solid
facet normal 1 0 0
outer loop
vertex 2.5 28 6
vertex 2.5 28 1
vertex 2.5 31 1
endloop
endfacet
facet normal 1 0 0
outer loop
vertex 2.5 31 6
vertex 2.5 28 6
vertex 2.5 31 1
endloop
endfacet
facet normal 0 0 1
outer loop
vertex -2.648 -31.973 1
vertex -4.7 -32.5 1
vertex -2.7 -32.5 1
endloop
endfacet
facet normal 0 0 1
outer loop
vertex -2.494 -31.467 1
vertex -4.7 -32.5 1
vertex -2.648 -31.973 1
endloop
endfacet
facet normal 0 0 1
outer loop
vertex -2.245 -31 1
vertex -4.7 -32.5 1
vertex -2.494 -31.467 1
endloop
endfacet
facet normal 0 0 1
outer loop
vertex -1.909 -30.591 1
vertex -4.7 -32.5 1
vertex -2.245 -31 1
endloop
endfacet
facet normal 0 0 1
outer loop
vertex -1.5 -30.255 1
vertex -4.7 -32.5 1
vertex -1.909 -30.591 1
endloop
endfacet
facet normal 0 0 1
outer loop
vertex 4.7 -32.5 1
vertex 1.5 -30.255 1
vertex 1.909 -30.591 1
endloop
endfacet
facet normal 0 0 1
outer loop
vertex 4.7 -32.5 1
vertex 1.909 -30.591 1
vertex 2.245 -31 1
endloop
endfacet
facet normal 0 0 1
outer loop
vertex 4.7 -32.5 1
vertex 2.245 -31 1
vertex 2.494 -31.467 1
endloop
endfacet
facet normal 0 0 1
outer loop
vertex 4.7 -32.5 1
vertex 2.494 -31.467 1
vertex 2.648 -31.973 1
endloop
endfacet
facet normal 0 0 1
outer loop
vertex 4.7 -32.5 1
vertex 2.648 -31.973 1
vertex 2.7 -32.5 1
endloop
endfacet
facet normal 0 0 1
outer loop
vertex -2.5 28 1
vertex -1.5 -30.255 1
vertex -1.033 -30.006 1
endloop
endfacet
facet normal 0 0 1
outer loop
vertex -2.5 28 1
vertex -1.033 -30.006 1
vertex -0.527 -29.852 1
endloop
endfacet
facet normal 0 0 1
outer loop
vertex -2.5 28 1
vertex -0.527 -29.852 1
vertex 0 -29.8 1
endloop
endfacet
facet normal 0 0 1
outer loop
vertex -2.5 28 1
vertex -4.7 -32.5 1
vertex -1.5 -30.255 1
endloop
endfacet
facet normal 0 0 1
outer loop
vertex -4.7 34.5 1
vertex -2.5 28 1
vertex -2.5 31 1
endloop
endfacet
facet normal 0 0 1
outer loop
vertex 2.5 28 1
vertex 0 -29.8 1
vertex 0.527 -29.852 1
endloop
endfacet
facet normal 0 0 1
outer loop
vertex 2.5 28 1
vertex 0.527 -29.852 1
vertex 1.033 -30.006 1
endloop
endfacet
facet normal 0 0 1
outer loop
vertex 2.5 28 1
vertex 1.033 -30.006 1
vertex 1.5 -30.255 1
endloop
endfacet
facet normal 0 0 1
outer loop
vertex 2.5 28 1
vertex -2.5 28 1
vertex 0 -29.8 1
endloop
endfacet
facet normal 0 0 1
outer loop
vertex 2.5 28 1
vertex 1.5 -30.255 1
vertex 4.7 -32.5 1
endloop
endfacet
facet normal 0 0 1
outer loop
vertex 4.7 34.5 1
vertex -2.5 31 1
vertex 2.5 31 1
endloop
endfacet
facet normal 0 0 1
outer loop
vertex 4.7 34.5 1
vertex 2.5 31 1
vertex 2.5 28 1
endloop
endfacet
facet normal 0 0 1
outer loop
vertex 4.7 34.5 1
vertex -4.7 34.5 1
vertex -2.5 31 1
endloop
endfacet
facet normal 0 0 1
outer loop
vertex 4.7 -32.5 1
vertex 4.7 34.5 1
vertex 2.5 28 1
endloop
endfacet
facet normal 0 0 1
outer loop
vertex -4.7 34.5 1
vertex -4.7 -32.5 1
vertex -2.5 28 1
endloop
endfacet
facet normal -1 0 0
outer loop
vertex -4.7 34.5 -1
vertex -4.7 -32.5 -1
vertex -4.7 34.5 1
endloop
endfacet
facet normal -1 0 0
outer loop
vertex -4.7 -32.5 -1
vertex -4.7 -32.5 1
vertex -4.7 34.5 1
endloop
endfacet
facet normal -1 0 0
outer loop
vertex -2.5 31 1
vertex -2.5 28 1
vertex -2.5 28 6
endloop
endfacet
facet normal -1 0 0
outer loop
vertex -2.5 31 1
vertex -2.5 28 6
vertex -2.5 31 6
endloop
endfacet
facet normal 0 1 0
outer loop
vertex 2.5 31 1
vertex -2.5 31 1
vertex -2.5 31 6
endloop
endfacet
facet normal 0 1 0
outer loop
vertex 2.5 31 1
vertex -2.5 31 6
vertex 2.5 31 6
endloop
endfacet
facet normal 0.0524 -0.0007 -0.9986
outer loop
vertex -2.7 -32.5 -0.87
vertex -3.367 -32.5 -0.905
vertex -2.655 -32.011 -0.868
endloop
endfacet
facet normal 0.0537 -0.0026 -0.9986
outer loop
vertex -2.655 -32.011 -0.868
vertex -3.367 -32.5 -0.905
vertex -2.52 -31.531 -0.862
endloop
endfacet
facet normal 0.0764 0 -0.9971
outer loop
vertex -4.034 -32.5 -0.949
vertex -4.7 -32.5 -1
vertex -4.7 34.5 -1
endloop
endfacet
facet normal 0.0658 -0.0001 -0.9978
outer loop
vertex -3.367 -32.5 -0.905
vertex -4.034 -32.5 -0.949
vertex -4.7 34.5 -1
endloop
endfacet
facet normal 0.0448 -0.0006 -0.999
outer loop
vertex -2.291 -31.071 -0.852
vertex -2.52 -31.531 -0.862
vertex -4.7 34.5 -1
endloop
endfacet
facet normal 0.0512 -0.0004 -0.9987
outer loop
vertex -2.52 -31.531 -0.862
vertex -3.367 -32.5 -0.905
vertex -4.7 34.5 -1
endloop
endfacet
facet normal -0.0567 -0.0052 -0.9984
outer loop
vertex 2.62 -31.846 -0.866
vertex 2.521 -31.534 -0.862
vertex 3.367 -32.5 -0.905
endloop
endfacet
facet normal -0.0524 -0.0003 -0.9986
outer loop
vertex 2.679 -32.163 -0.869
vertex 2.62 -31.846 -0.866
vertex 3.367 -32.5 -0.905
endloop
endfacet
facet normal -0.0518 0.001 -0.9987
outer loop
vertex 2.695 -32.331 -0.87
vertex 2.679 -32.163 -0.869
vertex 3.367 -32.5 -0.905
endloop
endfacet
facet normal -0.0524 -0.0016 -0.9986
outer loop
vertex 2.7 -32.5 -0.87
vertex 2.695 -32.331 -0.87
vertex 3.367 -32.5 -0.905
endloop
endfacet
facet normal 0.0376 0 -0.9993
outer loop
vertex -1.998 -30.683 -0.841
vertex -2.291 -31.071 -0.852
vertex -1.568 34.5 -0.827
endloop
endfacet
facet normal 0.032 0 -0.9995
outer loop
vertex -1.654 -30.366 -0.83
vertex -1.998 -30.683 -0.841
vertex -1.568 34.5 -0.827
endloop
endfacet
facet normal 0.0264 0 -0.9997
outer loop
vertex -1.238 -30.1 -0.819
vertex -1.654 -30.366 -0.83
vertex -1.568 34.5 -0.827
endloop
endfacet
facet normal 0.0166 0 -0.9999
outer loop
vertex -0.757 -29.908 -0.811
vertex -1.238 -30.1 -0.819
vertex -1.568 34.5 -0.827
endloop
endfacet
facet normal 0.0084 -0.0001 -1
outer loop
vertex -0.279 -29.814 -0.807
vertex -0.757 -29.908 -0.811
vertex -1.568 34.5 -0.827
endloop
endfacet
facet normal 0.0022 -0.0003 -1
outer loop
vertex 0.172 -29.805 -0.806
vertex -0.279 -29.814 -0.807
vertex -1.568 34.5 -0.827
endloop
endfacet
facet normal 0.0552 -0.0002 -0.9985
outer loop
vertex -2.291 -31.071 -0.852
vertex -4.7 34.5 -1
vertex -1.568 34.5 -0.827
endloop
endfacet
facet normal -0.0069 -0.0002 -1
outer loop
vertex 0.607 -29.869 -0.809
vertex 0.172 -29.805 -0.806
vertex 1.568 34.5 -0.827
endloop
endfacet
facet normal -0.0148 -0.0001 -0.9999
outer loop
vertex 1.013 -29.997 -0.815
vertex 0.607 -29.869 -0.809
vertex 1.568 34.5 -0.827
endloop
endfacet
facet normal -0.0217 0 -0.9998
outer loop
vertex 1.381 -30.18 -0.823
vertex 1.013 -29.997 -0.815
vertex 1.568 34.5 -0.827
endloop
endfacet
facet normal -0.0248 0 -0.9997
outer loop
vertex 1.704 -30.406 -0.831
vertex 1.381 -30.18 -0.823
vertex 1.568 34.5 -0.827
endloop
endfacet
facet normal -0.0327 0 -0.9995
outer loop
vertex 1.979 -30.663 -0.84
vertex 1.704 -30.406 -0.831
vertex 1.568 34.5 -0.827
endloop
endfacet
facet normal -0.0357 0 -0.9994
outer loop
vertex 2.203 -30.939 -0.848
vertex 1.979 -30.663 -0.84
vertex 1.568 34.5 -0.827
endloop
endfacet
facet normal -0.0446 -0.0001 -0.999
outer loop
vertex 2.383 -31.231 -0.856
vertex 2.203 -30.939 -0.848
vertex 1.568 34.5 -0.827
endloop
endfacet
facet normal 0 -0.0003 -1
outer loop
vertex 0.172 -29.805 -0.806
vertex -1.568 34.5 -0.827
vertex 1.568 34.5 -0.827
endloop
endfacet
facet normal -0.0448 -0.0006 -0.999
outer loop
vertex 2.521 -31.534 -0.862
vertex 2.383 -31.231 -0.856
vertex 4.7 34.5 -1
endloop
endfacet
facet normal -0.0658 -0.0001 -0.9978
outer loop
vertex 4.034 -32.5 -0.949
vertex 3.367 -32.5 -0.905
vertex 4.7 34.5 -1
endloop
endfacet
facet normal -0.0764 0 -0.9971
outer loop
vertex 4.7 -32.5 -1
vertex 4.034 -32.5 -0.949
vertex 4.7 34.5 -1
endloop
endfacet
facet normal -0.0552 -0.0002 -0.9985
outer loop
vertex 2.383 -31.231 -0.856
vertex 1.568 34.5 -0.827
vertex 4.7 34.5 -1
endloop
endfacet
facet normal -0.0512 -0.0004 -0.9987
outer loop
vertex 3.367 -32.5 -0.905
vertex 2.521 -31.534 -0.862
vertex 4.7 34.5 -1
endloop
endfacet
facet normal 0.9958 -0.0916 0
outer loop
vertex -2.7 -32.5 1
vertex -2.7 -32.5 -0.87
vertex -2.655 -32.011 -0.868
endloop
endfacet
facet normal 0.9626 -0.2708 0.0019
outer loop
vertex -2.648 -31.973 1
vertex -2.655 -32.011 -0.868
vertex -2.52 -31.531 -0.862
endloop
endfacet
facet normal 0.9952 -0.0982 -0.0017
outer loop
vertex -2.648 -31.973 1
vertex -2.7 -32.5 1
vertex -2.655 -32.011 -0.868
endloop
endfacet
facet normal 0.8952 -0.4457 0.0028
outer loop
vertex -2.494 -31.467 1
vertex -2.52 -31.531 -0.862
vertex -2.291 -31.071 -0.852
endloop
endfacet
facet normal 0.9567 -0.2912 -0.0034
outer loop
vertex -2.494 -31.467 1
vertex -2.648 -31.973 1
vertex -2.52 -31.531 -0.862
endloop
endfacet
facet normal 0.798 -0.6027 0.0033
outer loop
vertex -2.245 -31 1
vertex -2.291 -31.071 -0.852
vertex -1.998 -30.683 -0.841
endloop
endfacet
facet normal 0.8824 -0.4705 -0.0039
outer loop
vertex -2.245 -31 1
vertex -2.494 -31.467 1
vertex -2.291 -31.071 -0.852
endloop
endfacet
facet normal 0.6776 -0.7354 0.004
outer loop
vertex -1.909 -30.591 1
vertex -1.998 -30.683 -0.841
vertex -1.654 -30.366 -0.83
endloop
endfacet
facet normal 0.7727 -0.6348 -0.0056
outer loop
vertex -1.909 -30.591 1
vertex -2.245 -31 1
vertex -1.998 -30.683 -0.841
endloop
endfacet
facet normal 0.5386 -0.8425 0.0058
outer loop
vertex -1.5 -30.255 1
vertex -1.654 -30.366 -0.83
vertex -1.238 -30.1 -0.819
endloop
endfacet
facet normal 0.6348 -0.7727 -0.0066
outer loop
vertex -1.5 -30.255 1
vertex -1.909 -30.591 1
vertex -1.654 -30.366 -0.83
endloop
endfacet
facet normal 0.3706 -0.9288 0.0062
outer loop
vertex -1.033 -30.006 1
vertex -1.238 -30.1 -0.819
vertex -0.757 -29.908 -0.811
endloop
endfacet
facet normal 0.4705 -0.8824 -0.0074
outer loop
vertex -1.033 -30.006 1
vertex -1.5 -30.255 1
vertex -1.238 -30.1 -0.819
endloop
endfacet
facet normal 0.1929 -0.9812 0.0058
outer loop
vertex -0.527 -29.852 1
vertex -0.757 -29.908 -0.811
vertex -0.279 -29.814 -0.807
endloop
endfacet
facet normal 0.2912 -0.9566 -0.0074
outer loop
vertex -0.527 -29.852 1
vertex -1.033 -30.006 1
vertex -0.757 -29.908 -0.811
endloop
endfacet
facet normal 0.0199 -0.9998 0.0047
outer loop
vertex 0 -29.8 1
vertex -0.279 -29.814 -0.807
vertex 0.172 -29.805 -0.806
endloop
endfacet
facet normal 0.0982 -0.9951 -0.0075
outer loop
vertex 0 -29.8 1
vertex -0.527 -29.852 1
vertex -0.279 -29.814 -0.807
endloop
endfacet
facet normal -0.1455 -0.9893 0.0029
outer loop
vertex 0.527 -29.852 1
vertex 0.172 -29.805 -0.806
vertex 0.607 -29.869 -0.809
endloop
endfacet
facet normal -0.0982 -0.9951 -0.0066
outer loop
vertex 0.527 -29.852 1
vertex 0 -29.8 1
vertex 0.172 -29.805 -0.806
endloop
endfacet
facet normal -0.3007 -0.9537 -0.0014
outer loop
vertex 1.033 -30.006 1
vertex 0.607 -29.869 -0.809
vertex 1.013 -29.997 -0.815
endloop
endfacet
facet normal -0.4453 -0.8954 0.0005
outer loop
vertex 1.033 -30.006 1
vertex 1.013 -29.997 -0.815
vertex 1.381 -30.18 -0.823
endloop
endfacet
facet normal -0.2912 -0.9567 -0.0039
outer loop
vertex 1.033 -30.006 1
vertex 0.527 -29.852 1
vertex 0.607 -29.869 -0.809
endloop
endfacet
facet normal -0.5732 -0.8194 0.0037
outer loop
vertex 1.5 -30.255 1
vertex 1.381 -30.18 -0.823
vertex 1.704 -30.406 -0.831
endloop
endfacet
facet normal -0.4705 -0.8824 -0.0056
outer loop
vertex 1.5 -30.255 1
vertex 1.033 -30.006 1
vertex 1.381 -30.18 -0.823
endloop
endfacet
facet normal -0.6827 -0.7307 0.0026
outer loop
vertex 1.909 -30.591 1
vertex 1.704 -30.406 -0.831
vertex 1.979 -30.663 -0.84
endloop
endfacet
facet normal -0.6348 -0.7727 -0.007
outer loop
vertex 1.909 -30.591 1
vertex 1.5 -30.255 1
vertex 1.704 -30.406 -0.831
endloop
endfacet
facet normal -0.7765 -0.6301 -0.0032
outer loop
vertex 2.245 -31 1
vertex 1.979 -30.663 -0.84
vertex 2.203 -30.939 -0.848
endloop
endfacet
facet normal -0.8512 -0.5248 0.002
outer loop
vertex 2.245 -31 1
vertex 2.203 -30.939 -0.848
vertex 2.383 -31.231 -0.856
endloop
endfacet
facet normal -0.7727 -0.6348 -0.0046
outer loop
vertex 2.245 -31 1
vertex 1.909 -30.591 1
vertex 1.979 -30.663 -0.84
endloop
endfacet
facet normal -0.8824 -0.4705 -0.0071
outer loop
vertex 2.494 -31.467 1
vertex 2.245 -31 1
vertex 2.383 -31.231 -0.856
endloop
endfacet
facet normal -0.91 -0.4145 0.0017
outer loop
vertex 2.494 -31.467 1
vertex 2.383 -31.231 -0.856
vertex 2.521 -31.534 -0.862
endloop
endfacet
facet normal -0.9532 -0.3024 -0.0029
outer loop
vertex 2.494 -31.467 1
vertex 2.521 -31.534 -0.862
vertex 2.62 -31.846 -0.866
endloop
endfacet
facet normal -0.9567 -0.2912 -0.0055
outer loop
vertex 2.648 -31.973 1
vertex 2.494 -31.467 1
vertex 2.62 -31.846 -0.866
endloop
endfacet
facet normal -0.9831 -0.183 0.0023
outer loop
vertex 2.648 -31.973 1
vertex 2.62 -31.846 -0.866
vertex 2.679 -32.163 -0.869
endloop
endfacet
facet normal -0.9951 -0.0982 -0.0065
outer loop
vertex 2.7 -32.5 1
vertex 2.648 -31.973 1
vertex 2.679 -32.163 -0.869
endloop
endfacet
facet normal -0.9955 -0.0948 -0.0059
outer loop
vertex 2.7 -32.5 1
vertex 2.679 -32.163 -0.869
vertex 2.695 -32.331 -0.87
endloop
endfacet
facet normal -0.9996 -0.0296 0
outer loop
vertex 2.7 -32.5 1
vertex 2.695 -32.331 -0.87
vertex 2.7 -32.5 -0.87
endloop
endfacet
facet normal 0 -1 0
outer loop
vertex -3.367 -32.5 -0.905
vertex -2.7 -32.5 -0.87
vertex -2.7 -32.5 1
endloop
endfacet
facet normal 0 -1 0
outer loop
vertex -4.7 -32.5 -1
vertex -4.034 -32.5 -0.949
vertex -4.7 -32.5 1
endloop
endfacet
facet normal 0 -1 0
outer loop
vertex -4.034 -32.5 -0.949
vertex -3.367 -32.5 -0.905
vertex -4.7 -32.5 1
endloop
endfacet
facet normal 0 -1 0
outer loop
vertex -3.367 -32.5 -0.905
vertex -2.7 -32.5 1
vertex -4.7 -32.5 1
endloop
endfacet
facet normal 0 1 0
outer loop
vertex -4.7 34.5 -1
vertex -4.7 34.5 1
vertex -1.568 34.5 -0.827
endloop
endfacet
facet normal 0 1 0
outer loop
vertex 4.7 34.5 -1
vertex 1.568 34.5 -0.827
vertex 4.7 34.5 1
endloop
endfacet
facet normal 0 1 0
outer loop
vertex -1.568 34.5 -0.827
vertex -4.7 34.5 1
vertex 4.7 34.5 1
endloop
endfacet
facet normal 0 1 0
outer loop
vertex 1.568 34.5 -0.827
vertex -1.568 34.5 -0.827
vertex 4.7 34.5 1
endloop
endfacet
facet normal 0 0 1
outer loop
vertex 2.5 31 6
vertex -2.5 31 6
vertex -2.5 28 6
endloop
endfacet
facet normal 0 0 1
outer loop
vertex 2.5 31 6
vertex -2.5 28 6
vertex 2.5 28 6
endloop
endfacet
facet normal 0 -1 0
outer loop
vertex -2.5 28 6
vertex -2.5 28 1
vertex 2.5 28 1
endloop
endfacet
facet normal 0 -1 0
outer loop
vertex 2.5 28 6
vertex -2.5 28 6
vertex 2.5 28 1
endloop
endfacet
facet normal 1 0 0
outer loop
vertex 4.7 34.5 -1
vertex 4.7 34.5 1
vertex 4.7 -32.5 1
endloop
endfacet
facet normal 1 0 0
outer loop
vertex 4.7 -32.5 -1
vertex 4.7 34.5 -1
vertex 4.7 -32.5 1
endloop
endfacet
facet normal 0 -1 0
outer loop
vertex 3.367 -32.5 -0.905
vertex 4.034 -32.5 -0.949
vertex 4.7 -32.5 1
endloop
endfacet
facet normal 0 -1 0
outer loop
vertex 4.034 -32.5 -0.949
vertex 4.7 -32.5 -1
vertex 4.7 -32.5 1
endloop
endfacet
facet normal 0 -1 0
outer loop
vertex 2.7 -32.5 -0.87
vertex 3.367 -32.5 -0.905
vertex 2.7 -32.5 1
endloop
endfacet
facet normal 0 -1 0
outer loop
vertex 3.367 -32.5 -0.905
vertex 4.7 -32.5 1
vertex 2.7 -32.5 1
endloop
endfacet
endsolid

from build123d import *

# Parameters (mm, degrees)
BOSS_EXTRUDE1_DEPTH     = 1
CUT_EXTRUDE2_DEPTH      = 35.5
CUT_EXTRUDE2_DEPTH_BACK = 33.5
SKETCH3_W               = 5
SKETCH3_H               = 3
BOSS_EXTRUDE2_DEPTH     = 5


with BuildPart() as part:
    # Sketch1 → Boss-Extrude1 (new body, symmetric)
    with BuildSketch(Plane.XY):
        with BuildLine():
            Line((-2.7, 32.5), (-2.7, -32.5))
            ThreePointArc((-2.7, -32.5), (0, -29.8), (2.7, -32.5))
            Line((2.7, -32.5), (2.7, 32.5))
            Line((2.7, 32.5), (-2.7, 32.5))
        make_face()
        Polygon((4.7, -32.5), (2.7, -32.5), (2.7, 32.5), (-2.7, 32.5), (-2.7, -32.5), (-4.7, -32.5), (-4.7, 34.5), (4.7, 34.5), align=None)
    extrude(amount=BOSS_EXTRUDE1_DEPTH, both=True)

    # Sketch2 → Cut-Extrude2 (cut, two sides)
    with BuildSketch(Plane(origin=(0, 0, 0), x_dir=(1, 0, 0), z_dir=(0, 1, 0))) as cut_extrude2_sk:
        with BuildLine():
            ThreePointArc((-4.7, 1), (0, 0.805897581), (4.7, 1))
            Line((4.7, 1), (-4.7, 1))
        make_face()
        with BuildLine():
            Line((-4.7, 1), (4.7, 1))
            ThreePointArc((4.7, 1), (41.93387652, 19.198255851), (57, 57.805897581))
            ThreePointArc((57, 57.805897581), (-38.607641731, 99.739774101), (-4.7, 1))
        make_face()
    extrude(amount=CUT_EXTRUDE2_DEPTH, mode=Mode.SUBTRACT)
    extrude(cut_extrude2_sk.sketch, amount=-CUT_EXTRUDE2_DEPTH_BACK, mode=Mode.SUBTRACT)

    # Sketch3 → Boss-Extrude2 (add)
    with BuildSketch(Plane.XY.offset(1)):
        with Locations((0, 29.5)):
            Rectangle(SKETCH3_W, SKETCH3_H)
    extrude(amount=BOSS_EXTRUDE2_DEPTH)


solid = part.part
